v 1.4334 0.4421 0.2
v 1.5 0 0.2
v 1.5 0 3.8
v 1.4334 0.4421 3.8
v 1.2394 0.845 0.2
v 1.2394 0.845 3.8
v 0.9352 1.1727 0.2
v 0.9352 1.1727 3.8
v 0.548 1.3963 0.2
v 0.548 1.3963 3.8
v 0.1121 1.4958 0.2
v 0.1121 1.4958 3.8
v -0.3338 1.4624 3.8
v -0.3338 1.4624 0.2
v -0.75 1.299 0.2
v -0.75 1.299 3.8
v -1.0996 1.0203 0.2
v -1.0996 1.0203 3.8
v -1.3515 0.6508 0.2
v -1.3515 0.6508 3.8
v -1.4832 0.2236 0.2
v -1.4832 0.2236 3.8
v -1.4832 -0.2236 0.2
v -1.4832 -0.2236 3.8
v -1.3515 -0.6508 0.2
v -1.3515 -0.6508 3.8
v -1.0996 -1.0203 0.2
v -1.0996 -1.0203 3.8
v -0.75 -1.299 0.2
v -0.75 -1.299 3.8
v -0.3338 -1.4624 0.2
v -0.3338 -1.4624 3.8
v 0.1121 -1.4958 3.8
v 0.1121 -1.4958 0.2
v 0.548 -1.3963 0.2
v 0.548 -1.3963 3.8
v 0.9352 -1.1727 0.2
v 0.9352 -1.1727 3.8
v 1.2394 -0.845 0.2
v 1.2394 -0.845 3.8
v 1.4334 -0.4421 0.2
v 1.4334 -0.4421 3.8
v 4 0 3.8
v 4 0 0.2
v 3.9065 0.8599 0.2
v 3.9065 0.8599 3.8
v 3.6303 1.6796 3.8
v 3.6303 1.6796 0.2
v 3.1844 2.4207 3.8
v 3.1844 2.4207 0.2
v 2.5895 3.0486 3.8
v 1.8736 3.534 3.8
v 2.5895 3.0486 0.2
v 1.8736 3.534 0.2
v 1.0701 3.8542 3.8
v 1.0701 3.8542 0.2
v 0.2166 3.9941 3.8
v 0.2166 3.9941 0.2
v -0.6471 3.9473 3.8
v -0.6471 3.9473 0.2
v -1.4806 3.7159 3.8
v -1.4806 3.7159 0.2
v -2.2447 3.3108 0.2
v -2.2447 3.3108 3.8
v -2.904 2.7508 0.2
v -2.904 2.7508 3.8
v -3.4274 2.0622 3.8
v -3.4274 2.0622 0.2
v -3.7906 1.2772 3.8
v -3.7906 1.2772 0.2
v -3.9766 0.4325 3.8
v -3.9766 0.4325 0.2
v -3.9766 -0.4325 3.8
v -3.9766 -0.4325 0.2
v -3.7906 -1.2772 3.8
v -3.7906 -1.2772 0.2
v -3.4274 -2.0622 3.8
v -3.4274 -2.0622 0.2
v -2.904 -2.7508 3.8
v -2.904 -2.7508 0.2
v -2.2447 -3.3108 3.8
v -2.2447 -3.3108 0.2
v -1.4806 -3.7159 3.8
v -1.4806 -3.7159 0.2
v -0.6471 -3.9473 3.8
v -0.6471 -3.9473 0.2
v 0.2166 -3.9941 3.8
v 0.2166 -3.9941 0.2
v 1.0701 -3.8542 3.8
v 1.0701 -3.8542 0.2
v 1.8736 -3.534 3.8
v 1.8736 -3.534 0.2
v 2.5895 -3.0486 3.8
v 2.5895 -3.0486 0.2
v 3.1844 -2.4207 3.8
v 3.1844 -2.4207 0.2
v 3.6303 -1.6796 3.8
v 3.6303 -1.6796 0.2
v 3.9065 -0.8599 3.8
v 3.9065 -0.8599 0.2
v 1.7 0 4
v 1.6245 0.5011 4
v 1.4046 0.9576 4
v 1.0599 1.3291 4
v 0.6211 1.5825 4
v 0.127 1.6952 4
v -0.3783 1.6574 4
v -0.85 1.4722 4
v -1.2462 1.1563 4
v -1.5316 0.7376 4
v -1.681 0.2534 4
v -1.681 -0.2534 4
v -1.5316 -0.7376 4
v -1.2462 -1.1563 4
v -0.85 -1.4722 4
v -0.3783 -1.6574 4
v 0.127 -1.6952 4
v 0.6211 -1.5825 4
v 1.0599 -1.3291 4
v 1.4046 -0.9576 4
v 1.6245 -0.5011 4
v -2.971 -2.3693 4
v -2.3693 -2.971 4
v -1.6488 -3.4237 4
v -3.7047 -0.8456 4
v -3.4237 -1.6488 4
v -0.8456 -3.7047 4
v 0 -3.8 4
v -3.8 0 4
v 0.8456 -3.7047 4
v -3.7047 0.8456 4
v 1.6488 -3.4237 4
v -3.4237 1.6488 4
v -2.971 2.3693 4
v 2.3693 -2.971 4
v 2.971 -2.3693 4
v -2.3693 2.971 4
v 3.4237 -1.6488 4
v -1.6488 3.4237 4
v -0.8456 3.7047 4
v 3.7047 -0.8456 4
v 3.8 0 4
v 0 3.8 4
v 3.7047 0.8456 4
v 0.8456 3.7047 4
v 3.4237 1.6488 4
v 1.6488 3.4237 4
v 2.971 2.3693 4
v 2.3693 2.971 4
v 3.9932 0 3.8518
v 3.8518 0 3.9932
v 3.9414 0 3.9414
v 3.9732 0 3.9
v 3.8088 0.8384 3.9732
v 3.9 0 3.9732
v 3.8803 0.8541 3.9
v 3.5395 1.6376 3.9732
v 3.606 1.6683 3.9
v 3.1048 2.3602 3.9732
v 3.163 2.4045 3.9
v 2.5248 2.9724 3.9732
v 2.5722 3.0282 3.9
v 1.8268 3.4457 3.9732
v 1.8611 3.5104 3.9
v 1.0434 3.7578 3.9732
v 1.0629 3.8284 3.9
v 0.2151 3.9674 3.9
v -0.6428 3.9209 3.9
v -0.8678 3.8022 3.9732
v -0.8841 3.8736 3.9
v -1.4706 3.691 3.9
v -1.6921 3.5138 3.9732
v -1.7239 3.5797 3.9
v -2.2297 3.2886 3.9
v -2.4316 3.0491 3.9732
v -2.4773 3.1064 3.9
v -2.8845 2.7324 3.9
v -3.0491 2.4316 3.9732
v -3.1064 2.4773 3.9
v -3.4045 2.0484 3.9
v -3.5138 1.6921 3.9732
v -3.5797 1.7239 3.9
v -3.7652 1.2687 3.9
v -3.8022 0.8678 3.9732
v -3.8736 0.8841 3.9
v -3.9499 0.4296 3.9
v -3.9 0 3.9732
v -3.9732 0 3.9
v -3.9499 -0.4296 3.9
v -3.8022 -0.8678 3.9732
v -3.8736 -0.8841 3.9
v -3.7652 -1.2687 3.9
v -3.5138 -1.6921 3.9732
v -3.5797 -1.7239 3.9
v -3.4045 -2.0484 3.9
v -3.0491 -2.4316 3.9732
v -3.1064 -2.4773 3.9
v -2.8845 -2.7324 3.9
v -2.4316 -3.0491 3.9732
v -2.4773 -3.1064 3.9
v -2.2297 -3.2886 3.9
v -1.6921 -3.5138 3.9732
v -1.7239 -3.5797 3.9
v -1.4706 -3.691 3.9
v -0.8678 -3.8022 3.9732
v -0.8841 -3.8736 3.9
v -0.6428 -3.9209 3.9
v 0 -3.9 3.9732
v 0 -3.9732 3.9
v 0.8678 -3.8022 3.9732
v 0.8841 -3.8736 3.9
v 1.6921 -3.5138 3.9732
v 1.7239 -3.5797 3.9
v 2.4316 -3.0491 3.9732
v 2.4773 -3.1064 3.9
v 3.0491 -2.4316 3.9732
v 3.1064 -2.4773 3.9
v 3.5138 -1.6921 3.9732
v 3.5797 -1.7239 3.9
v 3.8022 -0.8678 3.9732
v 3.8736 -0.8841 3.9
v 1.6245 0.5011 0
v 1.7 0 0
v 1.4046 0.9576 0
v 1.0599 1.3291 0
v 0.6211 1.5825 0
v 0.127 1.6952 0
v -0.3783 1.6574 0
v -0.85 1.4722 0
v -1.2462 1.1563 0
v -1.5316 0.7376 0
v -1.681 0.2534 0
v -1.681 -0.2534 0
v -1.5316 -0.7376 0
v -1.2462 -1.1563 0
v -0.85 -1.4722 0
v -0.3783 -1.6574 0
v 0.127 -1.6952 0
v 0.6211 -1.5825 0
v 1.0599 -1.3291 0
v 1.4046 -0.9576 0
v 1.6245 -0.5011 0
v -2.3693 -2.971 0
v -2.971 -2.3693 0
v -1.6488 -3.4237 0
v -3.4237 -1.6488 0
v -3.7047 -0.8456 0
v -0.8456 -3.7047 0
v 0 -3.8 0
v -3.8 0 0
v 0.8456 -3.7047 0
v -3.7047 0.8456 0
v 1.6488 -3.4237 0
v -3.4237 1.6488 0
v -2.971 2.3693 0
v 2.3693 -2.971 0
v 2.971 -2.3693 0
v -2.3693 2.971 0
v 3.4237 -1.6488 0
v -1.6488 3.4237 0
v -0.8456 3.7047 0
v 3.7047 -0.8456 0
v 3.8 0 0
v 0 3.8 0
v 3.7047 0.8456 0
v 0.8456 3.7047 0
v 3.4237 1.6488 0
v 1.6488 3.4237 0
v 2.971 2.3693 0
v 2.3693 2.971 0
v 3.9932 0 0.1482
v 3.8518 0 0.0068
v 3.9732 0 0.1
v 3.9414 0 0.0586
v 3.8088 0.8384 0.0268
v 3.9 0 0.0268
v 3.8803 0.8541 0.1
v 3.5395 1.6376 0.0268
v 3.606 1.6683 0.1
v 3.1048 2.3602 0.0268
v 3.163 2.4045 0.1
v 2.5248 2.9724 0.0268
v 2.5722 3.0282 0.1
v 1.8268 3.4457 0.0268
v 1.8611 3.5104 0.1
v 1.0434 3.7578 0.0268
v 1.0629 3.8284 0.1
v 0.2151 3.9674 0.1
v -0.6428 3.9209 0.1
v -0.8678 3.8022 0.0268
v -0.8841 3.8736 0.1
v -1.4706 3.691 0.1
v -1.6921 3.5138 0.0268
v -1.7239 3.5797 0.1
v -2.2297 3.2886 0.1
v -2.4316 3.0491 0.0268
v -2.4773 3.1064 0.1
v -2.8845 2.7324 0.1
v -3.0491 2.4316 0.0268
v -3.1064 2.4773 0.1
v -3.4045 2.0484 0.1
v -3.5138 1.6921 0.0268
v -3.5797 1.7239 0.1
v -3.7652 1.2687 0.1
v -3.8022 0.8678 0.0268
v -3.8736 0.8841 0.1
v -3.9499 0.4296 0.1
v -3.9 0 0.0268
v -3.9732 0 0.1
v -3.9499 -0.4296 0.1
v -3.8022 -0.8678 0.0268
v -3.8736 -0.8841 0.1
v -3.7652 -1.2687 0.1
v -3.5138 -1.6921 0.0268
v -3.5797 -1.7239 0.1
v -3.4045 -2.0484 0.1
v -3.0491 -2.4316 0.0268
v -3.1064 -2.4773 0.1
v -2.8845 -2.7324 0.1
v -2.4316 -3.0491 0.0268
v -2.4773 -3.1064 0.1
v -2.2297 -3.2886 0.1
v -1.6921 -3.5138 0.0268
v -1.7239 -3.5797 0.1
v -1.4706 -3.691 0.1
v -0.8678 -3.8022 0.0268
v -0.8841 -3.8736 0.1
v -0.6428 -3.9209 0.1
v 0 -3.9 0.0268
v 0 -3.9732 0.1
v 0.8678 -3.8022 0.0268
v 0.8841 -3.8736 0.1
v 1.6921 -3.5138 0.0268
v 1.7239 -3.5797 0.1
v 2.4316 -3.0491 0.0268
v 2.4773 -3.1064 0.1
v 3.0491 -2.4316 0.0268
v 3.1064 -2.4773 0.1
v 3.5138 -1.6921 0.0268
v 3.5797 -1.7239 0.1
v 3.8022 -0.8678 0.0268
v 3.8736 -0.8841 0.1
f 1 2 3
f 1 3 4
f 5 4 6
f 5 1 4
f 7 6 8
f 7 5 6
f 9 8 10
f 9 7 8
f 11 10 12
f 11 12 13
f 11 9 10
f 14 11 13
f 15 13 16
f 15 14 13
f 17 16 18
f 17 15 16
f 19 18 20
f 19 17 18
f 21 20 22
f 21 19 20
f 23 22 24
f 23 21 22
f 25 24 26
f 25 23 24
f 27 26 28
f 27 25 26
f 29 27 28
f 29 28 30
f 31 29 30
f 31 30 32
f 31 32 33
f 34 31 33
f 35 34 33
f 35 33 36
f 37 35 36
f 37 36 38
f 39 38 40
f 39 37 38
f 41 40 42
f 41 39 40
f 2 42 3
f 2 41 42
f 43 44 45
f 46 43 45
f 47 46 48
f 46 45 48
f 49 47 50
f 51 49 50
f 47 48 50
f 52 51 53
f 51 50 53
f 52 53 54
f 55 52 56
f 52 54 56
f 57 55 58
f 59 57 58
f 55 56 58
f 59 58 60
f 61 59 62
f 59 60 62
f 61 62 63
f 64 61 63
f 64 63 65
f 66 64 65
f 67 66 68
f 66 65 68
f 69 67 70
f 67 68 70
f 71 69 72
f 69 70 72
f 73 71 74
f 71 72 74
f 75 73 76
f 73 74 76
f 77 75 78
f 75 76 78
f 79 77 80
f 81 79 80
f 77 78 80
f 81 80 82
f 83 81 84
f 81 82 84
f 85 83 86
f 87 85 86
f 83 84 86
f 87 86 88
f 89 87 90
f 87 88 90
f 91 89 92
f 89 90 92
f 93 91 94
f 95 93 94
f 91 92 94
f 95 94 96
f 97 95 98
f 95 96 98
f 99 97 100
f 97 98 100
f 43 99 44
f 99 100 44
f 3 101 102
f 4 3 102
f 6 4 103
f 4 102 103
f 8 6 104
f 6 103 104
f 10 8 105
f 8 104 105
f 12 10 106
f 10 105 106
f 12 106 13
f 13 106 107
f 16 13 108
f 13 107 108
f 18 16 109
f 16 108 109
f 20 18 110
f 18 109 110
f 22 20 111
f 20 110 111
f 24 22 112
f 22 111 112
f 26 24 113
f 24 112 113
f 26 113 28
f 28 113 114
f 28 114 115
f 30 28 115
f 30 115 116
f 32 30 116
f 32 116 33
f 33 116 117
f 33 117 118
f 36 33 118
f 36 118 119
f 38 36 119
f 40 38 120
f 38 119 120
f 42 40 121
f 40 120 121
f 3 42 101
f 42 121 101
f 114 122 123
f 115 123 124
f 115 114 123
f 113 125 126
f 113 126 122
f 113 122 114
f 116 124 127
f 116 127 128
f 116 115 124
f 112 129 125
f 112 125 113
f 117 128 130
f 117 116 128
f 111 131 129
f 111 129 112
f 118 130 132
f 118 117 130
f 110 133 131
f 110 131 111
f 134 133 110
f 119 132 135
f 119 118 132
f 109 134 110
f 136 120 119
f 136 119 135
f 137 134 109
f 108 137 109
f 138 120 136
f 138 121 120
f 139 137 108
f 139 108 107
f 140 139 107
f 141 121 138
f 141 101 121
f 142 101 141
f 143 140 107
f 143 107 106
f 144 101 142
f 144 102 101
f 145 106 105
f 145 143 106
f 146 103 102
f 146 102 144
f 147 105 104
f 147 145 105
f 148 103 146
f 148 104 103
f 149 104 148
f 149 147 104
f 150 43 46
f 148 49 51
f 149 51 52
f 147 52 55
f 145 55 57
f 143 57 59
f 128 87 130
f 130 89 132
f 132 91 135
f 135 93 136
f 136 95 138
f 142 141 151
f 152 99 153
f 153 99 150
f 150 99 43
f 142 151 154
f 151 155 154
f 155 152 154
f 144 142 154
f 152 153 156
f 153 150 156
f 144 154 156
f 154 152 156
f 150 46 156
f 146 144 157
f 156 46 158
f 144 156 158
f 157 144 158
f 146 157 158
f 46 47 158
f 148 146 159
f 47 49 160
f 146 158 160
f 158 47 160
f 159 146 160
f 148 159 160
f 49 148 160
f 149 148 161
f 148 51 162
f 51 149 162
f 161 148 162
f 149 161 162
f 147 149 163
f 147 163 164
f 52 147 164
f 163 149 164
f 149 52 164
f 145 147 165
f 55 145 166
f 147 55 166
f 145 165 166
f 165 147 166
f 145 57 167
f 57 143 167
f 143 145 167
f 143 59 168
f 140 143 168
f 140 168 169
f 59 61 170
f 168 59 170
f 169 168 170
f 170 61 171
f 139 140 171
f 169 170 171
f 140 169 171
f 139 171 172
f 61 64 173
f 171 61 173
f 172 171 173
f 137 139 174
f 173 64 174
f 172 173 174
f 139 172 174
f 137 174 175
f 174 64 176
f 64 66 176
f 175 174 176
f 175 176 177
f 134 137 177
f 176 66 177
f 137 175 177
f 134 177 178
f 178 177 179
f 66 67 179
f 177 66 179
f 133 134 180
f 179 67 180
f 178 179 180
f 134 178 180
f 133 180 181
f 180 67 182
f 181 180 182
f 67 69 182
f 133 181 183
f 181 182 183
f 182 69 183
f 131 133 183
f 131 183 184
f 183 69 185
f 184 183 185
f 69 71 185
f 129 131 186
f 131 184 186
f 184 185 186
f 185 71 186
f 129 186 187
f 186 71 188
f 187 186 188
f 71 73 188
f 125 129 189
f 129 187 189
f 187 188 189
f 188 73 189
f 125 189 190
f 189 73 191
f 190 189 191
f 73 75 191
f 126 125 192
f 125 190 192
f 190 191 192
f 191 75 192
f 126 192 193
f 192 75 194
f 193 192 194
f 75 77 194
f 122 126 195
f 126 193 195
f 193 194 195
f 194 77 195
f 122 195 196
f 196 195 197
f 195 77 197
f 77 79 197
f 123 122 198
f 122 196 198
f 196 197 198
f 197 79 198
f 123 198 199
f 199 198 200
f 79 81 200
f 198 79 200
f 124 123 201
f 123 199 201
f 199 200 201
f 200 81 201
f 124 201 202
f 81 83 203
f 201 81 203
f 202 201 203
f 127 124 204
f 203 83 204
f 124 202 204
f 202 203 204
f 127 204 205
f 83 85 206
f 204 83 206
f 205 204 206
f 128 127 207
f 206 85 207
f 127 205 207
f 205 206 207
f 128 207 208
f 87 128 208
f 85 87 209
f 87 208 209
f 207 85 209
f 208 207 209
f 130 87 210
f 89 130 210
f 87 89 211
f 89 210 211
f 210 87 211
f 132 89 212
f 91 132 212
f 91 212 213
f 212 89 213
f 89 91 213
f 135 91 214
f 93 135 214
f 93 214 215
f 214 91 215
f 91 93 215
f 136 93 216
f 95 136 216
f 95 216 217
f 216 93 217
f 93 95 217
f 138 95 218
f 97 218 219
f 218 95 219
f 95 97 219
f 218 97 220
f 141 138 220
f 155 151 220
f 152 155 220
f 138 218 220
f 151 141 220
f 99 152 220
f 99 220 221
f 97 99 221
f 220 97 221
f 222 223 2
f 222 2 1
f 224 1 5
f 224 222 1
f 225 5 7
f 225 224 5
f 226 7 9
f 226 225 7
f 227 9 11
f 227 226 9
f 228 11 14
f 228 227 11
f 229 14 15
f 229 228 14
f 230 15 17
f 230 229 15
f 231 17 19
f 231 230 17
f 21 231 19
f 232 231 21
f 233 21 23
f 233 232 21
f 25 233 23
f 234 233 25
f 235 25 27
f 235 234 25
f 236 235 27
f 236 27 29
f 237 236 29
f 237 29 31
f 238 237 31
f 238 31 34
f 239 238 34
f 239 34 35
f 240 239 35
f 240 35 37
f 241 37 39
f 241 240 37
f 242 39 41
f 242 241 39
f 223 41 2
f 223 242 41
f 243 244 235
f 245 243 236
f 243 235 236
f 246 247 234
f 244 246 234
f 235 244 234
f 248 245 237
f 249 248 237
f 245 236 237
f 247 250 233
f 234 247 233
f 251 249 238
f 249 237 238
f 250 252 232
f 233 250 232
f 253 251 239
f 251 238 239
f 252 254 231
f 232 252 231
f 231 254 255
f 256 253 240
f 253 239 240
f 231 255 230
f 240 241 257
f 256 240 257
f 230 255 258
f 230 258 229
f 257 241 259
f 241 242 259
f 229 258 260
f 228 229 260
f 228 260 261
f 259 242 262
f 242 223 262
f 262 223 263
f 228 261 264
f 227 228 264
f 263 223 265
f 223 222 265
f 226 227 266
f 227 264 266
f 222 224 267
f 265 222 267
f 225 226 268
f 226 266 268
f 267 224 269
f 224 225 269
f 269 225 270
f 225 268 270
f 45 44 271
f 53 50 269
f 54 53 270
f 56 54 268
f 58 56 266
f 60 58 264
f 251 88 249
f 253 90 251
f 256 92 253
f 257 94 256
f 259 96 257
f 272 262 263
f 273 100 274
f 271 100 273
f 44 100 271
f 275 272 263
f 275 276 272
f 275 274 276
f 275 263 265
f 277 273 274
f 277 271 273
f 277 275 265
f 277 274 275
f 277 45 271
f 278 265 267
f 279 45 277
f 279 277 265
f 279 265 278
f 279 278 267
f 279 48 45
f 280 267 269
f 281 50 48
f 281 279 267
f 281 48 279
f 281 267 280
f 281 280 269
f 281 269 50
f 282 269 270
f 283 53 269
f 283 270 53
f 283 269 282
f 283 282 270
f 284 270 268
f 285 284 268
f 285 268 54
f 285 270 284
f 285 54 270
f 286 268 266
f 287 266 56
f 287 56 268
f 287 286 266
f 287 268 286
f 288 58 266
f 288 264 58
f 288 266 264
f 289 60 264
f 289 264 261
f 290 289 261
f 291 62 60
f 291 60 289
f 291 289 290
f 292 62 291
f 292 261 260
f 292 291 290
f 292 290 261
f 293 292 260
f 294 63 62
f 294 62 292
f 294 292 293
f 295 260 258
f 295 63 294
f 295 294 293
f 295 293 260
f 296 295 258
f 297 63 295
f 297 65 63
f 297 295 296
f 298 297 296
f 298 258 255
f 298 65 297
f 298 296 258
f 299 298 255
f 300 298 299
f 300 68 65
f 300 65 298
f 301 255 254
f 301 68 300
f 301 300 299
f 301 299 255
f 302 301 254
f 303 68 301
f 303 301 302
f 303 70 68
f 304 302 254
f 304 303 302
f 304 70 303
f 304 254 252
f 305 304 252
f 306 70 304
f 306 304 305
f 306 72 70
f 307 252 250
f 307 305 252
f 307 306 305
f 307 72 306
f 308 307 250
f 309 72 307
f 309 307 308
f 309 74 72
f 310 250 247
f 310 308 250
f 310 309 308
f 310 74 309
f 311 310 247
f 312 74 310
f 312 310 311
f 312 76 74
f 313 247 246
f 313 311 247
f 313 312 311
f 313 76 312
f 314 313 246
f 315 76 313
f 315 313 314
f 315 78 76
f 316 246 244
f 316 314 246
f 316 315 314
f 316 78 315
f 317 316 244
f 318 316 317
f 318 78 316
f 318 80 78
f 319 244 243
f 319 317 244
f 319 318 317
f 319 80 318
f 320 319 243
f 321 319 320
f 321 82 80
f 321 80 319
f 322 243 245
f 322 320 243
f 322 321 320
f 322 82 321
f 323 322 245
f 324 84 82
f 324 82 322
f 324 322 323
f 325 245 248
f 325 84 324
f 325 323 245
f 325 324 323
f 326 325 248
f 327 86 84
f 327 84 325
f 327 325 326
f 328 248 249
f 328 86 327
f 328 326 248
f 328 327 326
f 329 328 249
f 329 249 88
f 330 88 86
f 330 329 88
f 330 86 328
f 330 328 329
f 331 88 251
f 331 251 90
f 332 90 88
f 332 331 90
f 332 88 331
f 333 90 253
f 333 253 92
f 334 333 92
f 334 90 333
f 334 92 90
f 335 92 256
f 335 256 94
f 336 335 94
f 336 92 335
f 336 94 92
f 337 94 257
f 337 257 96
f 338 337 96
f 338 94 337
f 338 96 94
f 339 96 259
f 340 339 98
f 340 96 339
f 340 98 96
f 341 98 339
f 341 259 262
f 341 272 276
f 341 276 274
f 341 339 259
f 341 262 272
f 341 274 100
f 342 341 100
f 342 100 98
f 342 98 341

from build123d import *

# Parameters (mm, degrees)
SKIZZE1_R                       = 4
SKIZZE1_R_2                     = 1.5
AUFSATZ_LINEAR_AUSTRAGEN1_DEPTH = 4
FASE1_SIZE                      = 0.2
VERRUNDUNG1_R                   = 0.2


with BuildPart() as part:
    # Skizze1 → Aufsatz-Linear austragen1 (new body)
    with BuildSketch(Plane.XY):
        Circle(SKIZZE1_R)
        Circle(SKIZZE1_R_2, mode=Mode.SUBTRACT)
    extrude(amount=AUFSATZ_LINEAR_AUSTRAGEN1_DEPTH)

    # Fase1
    fase1_edges = [part.edges().sort_by_distance(p)[0] for p in [
        (-1.5, 0, 0),
        (-1.5, 0, 4),
    ]]
    chamfer(fase1_edges, length=FASE1_SIZE)

    # Verrundung1
    verrundung1_edges = [part.edges().sort_by_distance(p)[0] for p in [
        (-4, 0, 0),
        (-4, 0, 4),
    ]]
    fillet(verrundung1_edges, radius=VERRUNDUNG1_R)


solid = part.part
